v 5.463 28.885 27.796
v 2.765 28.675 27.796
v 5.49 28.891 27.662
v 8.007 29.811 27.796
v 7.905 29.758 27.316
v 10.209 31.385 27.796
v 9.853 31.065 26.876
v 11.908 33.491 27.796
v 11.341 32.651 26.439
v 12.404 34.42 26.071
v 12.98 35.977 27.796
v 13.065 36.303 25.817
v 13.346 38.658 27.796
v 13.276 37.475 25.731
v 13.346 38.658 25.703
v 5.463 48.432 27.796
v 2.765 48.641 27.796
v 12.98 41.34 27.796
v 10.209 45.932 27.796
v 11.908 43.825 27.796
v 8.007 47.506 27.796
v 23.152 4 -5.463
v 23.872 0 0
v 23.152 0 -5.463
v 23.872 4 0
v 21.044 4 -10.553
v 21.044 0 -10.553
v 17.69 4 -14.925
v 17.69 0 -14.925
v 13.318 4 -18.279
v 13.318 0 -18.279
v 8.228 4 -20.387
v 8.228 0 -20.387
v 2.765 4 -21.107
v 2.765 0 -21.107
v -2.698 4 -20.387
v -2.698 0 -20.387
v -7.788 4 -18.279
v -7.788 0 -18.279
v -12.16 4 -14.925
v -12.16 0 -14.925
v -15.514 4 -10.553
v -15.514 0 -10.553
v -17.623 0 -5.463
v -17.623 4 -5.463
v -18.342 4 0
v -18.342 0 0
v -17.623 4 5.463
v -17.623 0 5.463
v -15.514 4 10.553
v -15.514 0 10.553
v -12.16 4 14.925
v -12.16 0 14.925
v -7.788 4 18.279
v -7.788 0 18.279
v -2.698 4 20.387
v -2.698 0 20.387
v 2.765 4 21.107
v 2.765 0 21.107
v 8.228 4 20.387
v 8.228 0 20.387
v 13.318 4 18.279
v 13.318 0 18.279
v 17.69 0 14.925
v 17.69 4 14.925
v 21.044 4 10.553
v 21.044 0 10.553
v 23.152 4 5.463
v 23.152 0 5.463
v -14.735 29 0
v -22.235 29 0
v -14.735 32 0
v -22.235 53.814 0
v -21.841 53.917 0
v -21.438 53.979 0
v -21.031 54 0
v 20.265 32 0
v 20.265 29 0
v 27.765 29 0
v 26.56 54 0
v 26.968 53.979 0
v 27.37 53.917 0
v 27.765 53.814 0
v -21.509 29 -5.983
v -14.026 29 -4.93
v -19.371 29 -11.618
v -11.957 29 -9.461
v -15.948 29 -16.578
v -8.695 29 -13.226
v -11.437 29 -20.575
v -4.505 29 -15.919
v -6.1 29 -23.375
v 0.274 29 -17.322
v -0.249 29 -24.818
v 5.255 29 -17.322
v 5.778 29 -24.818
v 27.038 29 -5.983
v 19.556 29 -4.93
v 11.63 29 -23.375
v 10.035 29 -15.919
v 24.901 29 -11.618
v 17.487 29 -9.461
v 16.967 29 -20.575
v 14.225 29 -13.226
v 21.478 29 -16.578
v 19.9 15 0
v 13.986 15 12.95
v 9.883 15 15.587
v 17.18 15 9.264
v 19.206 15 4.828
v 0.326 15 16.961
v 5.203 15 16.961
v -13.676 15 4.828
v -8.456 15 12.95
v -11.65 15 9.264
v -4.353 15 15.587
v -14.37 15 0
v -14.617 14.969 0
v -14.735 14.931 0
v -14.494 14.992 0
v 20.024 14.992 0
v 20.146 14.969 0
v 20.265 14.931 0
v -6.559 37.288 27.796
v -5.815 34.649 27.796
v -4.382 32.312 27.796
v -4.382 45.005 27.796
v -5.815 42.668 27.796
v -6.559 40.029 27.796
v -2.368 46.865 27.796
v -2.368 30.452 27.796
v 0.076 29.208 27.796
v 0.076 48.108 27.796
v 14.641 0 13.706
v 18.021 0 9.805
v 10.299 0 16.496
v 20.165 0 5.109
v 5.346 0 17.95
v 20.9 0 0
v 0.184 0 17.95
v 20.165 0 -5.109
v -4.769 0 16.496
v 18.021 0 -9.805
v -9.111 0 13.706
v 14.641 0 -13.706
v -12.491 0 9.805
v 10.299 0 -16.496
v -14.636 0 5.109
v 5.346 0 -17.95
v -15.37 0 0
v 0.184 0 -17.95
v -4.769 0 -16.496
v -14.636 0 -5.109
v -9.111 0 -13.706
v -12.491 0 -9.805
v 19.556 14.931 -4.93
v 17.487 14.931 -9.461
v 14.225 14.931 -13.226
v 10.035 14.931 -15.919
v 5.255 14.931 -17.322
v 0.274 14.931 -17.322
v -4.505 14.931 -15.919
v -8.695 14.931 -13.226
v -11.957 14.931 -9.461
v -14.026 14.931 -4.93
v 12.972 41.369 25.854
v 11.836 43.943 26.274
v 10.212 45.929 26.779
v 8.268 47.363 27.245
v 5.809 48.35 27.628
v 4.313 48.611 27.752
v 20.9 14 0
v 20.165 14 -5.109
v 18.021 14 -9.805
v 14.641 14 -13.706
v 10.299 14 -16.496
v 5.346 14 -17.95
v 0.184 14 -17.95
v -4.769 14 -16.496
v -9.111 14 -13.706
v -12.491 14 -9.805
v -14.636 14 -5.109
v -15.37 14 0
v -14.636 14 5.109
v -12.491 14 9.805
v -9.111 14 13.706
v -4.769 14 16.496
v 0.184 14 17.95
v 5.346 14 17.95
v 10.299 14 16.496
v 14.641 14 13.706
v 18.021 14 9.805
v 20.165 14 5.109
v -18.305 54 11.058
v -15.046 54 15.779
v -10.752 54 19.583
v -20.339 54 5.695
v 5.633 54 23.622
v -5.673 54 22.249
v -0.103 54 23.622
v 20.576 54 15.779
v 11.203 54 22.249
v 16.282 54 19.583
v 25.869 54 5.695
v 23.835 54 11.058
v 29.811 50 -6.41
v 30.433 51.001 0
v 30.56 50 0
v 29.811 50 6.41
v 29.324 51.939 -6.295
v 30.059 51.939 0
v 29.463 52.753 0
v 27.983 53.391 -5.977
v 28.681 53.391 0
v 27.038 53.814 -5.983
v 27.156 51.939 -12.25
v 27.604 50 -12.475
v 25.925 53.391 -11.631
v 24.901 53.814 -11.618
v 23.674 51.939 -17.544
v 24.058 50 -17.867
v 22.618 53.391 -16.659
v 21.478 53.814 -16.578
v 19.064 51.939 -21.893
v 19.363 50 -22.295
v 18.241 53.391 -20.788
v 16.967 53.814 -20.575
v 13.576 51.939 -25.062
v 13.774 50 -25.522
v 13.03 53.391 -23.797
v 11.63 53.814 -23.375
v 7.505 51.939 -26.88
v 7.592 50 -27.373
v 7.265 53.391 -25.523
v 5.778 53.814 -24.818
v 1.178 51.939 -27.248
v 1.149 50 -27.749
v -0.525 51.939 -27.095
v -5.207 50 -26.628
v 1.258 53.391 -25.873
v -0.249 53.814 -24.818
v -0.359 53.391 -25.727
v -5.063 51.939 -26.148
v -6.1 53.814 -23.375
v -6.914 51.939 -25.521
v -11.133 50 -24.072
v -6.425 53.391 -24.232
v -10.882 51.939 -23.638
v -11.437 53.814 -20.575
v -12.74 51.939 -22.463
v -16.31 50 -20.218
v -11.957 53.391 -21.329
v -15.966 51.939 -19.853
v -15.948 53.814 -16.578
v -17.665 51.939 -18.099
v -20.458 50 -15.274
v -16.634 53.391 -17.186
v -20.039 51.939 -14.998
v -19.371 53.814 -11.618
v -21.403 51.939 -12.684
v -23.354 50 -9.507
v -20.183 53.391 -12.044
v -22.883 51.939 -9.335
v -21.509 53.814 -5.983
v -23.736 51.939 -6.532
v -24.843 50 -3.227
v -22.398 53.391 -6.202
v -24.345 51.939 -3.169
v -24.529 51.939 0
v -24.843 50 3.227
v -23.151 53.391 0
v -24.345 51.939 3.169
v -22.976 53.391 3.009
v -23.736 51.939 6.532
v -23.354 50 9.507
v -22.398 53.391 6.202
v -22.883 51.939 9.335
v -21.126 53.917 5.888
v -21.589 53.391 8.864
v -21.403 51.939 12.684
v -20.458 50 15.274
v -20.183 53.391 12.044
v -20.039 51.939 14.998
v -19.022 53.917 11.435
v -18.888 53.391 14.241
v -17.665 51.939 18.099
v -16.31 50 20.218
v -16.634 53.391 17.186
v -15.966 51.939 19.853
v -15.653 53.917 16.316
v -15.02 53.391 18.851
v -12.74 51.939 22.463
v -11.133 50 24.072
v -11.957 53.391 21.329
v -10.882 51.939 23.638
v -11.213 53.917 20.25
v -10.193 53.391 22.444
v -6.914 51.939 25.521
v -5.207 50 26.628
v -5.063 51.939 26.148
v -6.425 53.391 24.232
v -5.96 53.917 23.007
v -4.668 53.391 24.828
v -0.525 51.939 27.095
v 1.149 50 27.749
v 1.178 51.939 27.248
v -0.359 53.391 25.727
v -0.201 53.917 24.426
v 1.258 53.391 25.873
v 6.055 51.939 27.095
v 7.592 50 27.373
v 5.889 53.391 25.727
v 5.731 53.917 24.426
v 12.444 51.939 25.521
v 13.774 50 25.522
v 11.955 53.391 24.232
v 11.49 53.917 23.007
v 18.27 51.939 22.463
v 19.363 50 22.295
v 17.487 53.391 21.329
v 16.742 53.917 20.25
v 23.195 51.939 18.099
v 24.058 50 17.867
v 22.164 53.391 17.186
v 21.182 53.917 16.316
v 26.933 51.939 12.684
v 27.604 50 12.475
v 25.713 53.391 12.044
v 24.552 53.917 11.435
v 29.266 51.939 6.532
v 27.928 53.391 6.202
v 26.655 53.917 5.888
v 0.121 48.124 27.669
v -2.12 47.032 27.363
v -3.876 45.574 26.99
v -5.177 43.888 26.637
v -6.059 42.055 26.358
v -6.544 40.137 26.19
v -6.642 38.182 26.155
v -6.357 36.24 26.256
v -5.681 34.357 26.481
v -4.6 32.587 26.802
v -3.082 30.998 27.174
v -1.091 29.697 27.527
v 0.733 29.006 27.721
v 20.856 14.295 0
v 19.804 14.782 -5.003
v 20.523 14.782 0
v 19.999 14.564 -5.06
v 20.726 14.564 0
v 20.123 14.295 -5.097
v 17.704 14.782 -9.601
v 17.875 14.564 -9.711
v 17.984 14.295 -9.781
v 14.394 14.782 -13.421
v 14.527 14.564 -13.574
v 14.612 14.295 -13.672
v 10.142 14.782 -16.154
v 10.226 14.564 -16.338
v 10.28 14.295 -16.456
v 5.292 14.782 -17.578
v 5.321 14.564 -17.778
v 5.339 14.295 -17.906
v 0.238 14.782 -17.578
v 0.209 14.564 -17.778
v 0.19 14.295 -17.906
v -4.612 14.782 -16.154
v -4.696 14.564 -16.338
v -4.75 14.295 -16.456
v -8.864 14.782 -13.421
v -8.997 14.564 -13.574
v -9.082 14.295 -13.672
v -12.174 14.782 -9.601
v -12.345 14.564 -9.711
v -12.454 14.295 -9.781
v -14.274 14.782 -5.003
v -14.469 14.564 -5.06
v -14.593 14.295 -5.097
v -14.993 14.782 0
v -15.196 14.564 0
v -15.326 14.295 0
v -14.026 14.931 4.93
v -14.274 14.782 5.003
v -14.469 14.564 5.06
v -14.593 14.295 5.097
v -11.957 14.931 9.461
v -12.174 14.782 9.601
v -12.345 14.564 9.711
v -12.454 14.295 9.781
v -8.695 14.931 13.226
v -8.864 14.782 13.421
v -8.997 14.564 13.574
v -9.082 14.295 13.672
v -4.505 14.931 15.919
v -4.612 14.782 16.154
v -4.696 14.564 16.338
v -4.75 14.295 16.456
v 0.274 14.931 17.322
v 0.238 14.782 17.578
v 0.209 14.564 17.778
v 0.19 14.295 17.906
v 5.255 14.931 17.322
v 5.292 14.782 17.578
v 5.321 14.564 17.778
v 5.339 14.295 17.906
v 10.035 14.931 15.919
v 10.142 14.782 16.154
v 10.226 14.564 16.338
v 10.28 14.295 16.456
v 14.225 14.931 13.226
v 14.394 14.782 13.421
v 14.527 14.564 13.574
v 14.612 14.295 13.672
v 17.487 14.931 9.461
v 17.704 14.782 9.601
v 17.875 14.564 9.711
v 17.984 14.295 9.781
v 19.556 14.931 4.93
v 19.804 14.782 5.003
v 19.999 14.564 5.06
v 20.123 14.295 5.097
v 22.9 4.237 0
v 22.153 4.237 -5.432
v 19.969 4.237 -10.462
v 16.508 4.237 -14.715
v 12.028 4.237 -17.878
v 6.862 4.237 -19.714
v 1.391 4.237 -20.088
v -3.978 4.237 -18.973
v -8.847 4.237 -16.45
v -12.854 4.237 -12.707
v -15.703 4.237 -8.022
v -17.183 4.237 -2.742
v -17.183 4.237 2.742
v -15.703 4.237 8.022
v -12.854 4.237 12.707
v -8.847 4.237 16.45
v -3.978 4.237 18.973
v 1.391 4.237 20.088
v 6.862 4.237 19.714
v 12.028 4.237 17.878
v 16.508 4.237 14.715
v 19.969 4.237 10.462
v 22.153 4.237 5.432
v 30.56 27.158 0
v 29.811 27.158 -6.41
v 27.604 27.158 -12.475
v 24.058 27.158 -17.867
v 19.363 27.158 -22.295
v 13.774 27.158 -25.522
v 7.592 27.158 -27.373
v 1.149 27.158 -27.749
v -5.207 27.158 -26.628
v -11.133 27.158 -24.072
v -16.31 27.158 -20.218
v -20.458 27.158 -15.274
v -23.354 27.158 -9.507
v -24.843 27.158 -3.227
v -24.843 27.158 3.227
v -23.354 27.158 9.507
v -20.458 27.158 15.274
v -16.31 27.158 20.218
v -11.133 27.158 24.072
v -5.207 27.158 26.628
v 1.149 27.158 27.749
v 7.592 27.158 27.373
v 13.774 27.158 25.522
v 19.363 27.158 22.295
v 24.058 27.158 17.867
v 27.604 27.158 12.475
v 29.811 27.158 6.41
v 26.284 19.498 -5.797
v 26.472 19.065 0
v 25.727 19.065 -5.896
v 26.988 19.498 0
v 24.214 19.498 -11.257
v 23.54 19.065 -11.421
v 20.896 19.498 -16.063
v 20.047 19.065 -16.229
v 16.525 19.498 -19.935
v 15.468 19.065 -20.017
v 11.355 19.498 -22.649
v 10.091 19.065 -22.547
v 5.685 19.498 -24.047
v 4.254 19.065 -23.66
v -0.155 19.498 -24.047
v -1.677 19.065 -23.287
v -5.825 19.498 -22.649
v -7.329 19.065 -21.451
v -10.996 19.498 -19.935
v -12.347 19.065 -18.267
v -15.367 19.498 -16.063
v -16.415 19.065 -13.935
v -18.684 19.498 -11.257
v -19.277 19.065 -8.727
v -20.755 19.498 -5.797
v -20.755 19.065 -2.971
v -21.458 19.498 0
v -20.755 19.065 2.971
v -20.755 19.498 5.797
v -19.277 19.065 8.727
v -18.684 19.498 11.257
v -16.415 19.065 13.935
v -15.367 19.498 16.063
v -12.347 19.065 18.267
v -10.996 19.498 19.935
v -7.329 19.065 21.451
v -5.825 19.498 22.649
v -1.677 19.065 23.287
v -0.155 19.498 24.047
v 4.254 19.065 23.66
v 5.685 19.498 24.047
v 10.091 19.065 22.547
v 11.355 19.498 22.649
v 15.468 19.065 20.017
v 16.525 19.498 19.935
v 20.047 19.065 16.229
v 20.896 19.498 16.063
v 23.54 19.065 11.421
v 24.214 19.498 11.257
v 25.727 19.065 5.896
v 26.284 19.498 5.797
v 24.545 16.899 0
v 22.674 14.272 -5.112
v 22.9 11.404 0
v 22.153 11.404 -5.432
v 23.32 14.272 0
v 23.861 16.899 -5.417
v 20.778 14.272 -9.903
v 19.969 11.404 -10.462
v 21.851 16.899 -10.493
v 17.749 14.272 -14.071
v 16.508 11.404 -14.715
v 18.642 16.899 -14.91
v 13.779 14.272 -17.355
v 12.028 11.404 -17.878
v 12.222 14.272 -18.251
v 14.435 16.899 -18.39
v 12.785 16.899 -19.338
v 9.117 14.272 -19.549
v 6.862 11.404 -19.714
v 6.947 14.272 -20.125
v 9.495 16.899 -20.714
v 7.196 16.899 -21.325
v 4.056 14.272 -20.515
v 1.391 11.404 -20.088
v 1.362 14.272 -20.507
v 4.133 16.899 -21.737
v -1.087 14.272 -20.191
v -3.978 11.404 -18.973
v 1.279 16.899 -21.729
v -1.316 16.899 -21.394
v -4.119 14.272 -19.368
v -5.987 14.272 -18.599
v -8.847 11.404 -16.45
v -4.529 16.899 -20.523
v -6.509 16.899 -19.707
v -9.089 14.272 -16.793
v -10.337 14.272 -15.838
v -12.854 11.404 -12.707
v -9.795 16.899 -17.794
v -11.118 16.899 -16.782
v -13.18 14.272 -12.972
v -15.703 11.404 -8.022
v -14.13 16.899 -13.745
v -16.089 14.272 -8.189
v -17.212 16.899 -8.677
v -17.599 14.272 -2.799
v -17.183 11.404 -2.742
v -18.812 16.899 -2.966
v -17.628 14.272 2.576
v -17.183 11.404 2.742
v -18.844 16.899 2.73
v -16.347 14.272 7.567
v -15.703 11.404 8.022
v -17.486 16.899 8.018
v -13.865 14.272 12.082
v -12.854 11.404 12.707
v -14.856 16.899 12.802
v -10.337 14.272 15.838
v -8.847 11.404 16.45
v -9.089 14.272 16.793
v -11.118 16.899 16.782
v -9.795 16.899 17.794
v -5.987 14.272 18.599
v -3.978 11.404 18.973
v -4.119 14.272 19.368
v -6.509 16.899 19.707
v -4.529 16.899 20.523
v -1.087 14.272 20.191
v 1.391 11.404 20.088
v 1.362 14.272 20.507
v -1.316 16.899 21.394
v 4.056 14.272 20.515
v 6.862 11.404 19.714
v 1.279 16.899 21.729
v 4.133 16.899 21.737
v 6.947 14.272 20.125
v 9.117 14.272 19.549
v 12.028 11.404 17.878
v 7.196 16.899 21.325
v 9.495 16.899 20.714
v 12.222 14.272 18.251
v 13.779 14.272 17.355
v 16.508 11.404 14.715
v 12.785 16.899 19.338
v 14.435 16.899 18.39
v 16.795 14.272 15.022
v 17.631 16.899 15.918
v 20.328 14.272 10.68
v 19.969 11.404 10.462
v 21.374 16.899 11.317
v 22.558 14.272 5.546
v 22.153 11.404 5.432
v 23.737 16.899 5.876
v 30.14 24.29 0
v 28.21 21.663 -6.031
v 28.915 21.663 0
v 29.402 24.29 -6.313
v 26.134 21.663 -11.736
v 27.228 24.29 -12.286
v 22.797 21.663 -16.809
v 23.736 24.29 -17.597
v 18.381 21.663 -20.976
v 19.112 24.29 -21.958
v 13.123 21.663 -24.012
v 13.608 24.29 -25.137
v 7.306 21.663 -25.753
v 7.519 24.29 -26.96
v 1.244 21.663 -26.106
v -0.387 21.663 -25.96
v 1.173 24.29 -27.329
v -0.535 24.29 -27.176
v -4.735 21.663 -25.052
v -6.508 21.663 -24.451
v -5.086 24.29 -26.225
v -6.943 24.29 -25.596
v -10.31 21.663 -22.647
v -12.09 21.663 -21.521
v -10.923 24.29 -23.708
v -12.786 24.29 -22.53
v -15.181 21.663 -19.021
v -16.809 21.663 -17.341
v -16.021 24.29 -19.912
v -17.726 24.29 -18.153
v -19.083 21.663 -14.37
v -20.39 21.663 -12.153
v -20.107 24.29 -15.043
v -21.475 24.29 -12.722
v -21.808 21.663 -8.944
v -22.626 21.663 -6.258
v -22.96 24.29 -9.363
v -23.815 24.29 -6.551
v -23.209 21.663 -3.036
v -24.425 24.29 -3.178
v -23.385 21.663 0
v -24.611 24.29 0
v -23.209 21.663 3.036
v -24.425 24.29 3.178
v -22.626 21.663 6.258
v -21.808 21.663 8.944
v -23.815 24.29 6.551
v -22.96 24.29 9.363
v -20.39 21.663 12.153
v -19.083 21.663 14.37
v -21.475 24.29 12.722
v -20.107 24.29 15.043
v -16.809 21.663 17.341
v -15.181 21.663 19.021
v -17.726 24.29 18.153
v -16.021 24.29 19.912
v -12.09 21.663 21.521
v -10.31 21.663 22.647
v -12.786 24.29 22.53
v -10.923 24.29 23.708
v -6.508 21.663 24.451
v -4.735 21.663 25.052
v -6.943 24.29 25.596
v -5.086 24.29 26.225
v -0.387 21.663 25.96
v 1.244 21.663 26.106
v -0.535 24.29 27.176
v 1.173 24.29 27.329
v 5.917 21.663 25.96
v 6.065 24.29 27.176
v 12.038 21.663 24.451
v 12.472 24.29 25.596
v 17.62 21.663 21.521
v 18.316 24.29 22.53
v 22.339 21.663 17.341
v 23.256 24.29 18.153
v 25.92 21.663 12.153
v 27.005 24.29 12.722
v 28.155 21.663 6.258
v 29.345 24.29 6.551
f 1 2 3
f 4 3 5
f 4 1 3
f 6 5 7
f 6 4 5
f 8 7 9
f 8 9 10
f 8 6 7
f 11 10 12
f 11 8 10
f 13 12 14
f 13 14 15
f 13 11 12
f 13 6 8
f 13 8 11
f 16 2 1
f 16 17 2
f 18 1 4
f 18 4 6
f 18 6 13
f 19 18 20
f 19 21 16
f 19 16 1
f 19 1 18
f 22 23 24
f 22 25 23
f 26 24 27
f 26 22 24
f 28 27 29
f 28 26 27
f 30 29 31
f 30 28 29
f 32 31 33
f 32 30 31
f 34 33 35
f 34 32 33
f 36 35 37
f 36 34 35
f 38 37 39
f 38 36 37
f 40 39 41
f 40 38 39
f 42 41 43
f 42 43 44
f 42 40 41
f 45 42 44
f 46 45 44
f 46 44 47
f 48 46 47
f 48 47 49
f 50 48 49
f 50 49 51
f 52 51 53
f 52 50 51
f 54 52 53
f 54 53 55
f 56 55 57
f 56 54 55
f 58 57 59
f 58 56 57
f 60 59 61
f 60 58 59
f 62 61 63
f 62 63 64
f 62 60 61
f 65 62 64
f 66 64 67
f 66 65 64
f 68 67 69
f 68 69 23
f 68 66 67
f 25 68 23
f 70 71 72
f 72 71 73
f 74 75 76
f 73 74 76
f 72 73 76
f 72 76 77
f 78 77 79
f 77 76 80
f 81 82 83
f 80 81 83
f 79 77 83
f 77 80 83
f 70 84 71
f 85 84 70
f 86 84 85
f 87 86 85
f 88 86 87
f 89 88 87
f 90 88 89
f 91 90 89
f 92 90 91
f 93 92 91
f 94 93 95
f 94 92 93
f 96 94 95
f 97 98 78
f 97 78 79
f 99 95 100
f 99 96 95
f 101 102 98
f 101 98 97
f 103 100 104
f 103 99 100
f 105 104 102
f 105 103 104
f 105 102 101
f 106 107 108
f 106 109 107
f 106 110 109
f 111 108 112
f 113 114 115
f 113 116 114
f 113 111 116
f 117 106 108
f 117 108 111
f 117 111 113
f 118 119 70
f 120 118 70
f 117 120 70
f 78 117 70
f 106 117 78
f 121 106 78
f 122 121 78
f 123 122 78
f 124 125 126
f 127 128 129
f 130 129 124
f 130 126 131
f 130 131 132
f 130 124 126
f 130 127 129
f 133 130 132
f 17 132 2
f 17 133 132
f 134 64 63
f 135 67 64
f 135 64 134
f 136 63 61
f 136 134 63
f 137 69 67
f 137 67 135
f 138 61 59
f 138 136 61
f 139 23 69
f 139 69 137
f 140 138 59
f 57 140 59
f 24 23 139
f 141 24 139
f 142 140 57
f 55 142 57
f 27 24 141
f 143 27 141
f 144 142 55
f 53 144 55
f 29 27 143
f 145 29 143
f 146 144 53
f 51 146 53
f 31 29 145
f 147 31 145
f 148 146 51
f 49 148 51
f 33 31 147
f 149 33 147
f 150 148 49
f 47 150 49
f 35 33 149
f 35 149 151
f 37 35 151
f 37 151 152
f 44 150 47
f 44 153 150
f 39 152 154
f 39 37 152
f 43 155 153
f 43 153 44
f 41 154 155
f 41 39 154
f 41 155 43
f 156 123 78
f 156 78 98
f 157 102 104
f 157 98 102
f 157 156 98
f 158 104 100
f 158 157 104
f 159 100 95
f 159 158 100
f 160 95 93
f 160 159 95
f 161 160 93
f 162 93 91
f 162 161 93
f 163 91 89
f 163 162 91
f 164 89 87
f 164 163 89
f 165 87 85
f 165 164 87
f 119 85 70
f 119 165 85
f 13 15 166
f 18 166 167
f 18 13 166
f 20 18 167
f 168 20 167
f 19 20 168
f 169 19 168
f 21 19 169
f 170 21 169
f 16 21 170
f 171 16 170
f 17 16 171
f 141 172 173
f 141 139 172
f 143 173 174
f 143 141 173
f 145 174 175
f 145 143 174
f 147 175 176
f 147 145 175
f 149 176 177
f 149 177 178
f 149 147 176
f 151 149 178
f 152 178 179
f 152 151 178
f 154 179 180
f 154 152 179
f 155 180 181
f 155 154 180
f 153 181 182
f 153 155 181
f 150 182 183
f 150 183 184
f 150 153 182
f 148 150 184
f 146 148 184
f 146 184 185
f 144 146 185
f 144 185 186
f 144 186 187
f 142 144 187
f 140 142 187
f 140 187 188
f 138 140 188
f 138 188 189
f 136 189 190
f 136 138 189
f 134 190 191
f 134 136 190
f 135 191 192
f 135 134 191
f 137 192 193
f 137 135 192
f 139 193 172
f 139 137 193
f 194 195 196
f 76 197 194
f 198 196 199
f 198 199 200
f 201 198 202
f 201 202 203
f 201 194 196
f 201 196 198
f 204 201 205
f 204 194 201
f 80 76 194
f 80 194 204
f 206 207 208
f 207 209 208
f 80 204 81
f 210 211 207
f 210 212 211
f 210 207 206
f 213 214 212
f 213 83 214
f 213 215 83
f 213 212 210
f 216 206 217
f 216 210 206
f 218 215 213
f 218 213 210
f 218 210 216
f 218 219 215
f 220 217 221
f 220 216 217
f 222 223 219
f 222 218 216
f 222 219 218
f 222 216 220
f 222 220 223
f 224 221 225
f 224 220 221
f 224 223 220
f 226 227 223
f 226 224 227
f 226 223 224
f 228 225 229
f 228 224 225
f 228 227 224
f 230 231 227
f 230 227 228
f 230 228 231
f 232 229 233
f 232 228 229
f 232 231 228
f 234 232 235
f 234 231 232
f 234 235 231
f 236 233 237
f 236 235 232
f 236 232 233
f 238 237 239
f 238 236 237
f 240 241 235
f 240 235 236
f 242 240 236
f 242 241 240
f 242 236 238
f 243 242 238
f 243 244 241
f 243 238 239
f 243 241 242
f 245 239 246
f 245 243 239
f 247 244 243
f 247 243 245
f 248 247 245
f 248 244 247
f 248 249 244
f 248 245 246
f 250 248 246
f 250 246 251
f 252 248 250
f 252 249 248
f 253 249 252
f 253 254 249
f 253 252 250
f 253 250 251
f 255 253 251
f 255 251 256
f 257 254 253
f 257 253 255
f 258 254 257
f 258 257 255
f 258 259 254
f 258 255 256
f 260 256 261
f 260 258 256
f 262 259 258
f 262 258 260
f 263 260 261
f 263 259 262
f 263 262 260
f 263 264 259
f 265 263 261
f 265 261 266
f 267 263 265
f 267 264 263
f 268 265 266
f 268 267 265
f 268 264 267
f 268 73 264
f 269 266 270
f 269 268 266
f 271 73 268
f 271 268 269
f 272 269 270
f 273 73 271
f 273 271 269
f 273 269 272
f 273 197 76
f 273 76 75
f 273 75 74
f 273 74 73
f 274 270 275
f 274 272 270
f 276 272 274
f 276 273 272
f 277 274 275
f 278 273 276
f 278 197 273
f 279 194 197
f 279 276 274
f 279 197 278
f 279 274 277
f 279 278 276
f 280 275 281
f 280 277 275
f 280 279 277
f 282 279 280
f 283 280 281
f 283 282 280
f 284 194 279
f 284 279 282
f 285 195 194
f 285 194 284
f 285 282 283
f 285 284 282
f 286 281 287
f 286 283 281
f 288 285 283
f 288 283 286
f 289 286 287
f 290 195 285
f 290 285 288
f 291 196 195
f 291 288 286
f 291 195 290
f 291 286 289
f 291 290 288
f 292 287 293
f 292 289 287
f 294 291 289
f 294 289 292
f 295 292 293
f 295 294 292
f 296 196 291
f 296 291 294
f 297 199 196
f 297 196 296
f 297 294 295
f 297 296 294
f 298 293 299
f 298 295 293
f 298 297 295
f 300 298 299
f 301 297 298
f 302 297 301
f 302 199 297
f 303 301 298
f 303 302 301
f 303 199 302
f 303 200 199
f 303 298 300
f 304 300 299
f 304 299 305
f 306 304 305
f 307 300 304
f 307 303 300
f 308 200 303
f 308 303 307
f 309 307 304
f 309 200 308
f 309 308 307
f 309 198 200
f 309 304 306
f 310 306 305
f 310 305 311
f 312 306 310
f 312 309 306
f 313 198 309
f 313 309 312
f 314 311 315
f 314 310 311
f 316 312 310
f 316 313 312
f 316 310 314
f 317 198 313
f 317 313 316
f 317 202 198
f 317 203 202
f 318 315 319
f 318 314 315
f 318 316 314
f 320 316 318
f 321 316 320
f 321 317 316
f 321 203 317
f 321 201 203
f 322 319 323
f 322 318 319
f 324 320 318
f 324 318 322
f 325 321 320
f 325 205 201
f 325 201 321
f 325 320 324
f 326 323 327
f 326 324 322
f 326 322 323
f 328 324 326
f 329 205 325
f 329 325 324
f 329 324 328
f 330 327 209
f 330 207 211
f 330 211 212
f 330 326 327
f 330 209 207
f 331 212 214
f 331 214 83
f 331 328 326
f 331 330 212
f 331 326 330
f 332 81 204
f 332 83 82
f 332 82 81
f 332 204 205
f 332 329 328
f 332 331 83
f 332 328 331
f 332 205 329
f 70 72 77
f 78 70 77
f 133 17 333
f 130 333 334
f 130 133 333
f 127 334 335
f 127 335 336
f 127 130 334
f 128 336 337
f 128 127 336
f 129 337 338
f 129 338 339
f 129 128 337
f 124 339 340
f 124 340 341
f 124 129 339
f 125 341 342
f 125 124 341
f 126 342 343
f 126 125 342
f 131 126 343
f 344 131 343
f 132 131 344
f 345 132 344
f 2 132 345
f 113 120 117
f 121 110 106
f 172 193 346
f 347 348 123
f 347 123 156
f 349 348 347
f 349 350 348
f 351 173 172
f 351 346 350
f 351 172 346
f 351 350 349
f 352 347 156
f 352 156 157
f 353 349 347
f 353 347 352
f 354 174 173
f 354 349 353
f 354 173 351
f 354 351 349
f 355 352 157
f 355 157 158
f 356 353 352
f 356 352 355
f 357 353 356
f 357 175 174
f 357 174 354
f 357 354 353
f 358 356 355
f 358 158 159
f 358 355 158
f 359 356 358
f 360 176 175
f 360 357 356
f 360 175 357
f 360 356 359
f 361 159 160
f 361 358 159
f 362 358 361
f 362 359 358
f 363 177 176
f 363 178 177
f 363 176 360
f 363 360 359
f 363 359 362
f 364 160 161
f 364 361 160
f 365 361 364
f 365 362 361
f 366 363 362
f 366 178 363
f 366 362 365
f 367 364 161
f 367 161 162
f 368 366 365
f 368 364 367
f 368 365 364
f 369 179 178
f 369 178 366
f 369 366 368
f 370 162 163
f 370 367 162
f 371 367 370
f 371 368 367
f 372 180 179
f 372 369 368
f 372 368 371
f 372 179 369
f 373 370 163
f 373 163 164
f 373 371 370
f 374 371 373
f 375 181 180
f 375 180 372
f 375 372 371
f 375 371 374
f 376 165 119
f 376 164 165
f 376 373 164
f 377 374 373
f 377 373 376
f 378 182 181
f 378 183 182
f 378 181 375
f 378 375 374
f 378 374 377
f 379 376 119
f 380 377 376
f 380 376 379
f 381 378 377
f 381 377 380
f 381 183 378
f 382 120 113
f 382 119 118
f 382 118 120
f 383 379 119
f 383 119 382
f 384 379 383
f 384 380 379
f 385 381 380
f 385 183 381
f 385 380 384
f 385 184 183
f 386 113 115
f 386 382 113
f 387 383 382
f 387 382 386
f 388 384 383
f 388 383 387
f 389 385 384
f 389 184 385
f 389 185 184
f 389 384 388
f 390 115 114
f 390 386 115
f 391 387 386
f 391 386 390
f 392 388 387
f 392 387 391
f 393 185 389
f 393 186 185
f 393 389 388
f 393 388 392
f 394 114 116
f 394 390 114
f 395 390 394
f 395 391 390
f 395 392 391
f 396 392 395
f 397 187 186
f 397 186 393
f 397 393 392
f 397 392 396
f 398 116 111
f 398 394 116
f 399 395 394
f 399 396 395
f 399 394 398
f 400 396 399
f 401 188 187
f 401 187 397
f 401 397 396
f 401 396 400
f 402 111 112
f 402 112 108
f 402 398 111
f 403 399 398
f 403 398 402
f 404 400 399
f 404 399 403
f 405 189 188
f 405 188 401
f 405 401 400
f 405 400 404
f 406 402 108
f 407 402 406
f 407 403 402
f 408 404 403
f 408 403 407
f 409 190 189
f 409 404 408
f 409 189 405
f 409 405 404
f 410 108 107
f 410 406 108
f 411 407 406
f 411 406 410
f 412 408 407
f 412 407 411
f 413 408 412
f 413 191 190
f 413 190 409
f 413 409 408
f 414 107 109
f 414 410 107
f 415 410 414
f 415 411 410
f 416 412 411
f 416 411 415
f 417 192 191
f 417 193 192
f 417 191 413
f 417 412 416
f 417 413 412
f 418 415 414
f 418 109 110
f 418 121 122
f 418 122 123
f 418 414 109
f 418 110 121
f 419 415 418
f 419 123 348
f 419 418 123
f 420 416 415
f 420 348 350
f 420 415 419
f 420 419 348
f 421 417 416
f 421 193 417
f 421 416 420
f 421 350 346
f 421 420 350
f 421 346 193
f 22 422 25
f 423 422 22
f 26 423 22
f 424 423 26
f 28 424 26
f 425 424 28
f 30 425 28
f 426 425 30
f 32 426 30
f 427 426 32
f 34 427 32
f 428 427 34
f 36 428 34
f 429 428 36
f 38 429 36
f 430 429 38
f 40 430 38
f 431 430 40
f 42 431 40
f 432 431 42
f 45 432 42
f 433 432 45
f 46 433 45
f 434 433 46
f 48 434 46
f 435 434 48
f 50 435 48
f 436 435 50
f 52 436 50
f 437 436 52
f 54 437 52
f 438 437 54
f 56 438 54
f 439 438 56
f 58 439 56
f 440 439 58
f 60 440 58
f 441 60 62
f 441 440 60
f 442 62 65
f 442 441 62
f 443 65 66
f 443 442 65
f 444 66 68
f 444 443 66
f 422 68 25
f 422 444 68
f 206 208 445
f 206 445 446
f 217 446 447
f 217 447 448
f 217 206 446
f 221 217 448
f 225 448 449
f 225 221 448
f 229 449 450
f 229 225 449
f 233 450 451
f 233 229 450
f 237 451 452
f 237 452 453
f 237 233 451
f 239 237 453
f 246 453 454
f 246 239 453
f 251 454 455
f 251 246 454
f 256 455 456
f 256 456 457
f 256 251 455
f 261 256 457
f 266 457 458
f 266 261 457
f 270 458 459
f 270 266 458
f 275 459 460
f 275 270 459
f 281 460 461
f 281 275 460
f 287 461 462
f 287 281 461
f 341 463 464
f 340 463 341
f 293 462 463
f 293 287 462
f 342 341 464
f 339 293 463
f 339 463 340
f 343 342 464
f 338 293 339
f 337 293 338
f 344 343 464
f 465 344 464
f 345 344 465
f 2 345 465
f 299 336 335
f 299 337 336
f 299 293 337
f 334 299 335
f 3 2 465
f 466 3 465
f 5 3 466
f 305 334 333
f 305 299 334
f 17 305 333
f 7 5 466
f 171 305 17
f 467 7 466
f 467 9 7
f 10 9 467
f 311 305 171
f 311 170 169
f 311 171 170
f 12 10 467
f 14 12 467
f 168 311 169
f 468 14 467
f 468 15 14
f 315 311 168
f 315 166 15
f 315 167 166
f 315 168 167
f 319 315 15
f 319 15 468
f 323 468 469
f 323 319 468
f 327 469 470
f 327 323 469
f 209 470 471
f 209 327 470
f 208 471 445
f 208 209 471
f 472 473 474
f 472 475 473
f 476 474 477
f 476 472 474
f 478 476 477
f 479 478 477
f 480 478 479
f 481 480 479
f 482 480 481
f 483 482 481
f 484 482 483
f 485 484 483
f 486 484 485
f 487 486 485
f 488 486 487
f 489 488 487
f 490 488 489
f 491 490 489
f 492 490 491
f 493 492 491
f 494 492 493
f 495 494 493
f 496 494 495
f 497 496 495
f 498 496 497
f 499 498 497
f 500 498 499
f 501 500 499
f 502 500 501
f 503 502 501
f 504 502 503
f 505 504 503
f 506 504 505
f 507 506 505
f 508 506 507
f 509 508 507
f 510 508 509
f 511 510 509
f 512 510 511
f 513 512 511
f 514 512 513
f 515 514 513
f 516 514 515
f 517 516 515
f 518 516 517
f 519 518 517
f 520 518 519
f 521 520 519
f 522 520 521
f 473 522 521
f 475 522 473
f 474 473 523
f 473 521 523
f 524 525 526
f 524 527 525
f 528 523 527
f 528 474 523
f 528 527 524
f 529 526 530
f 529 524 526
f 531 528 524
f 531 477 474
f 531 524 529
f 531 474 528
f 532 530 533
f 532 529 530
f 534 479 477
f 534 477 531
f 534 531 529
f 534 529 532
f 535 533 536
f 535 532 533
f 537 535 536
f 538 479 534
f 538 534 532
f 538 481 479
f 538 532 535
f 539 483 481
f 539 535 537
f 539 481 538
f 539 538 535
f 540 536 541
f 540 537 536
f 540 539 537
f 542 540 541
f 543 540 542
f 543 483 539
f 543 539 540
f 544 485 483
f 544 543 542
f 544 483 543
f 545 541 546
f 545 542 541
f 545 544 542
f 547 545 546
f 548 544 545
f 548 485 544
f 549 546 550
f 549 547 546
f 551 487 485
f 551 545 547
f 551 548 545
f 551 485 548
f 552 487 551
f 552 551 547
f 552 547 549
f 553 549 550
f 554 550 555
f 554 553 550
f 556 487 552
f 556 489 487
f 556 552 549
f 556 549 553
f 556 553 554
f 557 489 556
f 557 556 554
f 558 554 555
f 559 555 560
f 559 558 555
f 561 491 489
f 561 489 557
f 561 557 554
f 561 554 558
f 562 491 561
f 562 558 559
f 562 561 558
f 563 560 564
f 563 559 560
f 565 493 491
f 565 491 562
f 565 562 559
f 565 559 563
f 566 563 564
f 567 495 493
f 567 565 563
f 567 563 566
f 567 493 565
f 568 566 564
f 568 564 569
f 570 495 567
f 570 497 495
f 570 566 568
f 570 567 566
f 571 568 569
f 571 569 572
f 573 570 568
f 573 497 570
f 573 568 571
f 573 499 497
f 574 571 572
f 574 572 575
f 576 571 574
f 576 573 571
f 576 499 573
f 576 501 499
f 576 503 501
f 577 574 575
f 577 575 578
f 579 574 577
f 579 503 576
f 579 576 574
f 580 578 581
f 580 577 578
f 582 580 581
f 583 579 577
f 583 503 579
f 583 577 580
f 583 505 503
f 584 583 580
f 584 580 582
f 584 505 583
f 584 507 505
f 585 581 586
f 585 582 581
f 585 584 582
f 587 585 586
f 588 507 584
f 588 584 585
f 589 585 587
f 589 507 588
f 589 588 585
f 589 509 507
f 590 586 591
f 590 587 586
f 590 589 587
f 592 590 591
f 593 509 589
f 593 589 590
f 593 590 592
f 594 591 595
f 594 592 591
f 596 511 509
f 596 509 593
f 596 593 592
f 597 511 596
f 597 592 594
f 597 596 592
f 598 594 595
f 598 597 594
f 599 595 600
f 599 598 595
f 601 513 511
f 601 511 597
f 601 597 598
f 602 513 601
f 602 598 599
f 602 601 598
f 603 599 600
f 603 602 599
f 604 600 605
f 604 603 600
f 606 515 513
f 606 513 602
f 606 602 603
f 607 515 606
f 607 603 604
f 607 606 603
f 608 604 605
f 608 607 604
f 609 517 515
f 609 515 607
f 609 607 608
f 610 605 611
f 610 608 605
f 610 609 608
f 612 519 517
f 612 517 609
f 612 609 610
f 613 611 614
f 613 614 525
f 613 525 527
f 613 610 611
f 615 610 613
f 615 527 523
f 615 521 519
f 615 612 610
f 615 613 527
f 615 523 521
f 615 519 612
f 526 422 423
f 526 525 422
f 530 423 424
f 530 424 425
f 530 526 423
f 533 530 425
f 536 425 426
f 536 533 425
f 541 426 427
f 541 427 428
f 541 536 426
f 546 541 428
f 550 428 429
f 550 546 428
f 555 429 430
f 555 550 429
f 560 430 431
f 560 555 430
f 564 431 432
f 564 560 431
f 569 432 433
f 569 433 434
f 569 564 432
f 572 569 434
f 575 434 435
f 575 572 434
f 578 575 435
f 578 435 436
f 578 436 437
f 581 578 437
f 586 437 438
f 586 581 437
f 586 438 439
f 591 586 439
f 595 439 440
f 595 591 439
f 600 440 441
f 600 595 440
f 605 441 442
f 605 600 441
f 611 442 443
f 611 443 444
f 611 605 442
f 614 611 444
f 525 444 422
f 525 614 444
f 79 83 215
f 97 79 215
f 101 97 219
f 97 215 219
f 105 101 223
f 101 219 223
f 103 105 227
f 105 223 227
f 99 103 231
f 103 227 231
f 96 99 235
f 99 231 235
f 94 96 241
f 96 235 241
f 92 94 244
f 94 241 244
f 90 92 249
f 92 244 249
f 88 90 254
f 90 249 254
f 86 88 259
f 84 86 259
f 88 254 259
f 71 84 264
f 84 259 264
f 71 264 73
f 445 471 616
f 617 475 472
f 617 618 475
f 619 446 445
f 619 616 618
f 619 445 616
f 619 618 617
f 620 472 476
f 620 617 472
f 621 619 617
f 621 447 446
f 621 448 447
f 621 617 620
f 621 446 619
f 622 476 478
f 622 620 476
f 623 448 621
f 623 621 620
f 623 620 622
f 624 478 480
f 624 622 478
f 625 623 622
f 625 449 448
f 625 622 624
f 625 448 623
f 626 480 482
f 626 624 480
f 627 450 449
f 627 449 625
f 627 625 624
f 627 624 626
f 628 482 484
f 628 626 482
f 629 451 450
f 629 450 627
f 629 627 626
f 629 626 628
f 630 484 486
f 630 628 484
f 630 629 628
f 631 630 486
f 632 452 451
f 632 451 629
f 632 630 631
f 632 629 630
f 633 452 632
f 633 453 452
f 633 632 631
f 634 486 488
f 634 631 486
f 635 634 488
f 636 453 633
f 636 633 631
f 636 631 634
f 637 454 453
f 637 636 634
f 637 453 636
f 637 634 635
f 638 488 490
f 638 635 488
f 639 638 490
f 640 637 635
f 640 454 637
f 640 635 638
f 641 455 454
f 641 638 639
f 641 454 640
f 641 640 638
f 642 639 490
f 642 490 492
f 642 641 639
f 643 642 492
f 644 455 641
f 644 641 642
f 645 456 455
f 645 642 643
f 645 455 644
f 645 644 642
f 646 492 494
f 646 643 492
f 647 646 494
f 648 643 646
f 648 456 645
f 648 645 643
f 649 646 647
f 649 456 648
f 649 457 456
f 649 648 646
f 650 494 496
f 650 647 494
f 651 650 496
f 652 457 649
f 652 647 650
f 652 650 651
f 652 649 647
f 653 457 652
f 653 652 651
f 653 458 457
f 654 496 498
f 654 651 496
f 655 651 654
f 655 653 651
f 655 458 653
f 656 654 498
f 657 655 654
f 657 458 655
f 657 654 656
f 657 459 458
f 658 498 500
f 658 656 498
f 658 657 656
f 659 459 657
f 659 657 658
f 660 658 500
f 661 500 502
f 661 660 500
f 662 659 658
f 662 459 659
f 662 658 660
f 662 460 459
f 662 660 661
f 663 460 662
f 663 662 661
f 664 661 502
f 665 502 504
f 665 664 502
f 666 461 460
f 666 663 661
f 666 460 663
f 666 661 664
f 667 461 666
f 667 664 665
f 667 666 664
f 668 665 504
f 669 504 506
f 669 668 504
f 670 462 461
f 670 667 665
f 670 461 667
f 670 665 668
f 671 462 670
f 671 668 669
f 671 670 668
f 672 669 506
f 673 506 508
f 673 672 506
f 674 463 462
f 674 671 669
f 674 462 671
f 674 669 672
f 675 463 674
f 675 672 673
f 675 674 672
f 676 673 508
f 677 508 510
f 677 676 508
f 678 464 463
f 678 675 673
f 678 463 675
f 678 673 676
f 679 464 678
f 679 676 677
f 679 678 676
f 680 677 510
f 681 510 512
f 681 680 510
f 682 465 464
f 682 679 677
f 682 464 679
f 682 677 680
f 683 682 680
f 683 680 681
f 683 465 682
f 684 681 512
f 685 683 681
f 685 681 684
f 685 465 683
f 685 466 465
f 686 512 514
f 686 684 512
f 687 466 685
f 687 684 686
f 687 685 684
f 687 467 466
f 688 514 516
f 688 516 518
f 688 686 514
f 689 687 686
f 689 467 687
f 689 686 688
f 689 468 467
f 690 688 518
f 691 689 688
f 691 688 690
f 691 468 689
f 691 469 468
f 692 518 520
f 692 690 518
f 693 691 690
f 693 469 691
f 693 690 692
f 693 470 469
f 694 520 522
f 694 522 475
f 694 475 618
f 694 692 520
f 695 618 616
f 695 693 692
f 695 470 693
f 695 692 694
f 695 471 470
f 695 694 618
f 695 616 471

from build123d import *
from build123d.topology import SkipClean

# Parameters (mm, degrees)
CUT_EXTRUDE2_DEPTH      = 25
SKETCH10_R              = 10
BOSS_EXTRUDE1_DEPTH     = 5
CUT_EXTRUDE3_DEPTH      = 15
CUT_EXTRUDE3_DEPTH_BACK = 10


with BuildPart() as part:
    # Sketch1 → Revolve1 (revolve)
    with BuildSketch(Plane.XY):
        with BuildLine():
            Line((20.9, 0), (23.871591838, 0))
            Line((23.871591838, 0), (23.871591838, 4))
            Line((23.871591838, 4), (22.9, 4.236662843))
            Line((22.9, 4.236662843), (22.9, 11.404308102))
            ThreePointArc((22.9, 11.404308102), (23.83692213, 15.63049072), (26.472123903, 19.064752533))
            Line((26.472123903, 19.064752533), (26.988320528, 19.497892931))
            ThreePointArc((26.988320528, 19.497892931), (29.623522302, 22.932154745), (30.560444431, 27.158337362))
            Line((30.560444431, 27.158337362), (30.560444431, 50))
            ThreePointArc((30.560444431, 50), (29.388871556, 52.828427125), (26.560444431, 54))
            Line((26.560444431, 54), (2.764914955, 54))
            Line((2.764914955, 54), (2.764914955, 15))
            Line((2.764914955, 15), (19.9, 15))
            ThreePointArc((19.9, 15), (20.607106781, 14.707106781), (20.9, 14))
            Line((20.9, 14), (20.9, 0))
        make_face()
    revolve(axis=Axis((2.764914955, 7.821821657, 0), (0, 1, 0)))

    # Sketch9 → Cut-Extrude2 (cut)
    with BuildSketch(Plane(origin=(0, 54, 0), x_dir=(1, 0, 0), z_dir=(0, 1, 0))):
        with BuildLine():
            Line((-22.235085045, 0), (27.764914955, 0))
            ThreePointArc((27.764914955, 0), (2.764914955, 25), (-22.235085045, 0))
        make_face()
    extrude(amount=-CUT_EXTRUDE2_DEPTH, mode=Mode.SUBTRACT)

    # Sketch10 → Boss-Extrude1 (add)
    with SkipClean():  # the faces are left unmerged after this step: merging them gives an invalid solid
        with BuildSketch(Plane.XY.offset(27.795529476)):
            with Locations((3.346345887, 38.658337362)):
                Circle(SKETCH10_R)
        extrude(amount=-BOSS_EXTRUDE1_DEPTH)

    # Sketch11 → Cut-Extrude3 (cut, two sides: drawn at the far end of the back side and taken through both)
    with SkipClean():  # the faces are left unmerged after this step: merging them gives an invalid solid
        with BuildSketch(Plane(origin=(0, 17, 0), x_dir=(1, 0, 0), z_dir=(0, 1, 0)).offset(-CUT_EXTRUDE3_DEPTH_BACK)):
            with BuildLine():
                Line((-14.735085045, 0), (20.264914955, 0))
                ThreePointArc((20.264914955, 0), (2.764914955, 17.5), (-14.735085045, 0))
            make_face()
        extrude(amount=CUT_EXTRUDE3_DEPTH + CUT_EXTRUDE3_DEPTH_BACK, mode=Mode.SUBTRACT)


solid = part.part
